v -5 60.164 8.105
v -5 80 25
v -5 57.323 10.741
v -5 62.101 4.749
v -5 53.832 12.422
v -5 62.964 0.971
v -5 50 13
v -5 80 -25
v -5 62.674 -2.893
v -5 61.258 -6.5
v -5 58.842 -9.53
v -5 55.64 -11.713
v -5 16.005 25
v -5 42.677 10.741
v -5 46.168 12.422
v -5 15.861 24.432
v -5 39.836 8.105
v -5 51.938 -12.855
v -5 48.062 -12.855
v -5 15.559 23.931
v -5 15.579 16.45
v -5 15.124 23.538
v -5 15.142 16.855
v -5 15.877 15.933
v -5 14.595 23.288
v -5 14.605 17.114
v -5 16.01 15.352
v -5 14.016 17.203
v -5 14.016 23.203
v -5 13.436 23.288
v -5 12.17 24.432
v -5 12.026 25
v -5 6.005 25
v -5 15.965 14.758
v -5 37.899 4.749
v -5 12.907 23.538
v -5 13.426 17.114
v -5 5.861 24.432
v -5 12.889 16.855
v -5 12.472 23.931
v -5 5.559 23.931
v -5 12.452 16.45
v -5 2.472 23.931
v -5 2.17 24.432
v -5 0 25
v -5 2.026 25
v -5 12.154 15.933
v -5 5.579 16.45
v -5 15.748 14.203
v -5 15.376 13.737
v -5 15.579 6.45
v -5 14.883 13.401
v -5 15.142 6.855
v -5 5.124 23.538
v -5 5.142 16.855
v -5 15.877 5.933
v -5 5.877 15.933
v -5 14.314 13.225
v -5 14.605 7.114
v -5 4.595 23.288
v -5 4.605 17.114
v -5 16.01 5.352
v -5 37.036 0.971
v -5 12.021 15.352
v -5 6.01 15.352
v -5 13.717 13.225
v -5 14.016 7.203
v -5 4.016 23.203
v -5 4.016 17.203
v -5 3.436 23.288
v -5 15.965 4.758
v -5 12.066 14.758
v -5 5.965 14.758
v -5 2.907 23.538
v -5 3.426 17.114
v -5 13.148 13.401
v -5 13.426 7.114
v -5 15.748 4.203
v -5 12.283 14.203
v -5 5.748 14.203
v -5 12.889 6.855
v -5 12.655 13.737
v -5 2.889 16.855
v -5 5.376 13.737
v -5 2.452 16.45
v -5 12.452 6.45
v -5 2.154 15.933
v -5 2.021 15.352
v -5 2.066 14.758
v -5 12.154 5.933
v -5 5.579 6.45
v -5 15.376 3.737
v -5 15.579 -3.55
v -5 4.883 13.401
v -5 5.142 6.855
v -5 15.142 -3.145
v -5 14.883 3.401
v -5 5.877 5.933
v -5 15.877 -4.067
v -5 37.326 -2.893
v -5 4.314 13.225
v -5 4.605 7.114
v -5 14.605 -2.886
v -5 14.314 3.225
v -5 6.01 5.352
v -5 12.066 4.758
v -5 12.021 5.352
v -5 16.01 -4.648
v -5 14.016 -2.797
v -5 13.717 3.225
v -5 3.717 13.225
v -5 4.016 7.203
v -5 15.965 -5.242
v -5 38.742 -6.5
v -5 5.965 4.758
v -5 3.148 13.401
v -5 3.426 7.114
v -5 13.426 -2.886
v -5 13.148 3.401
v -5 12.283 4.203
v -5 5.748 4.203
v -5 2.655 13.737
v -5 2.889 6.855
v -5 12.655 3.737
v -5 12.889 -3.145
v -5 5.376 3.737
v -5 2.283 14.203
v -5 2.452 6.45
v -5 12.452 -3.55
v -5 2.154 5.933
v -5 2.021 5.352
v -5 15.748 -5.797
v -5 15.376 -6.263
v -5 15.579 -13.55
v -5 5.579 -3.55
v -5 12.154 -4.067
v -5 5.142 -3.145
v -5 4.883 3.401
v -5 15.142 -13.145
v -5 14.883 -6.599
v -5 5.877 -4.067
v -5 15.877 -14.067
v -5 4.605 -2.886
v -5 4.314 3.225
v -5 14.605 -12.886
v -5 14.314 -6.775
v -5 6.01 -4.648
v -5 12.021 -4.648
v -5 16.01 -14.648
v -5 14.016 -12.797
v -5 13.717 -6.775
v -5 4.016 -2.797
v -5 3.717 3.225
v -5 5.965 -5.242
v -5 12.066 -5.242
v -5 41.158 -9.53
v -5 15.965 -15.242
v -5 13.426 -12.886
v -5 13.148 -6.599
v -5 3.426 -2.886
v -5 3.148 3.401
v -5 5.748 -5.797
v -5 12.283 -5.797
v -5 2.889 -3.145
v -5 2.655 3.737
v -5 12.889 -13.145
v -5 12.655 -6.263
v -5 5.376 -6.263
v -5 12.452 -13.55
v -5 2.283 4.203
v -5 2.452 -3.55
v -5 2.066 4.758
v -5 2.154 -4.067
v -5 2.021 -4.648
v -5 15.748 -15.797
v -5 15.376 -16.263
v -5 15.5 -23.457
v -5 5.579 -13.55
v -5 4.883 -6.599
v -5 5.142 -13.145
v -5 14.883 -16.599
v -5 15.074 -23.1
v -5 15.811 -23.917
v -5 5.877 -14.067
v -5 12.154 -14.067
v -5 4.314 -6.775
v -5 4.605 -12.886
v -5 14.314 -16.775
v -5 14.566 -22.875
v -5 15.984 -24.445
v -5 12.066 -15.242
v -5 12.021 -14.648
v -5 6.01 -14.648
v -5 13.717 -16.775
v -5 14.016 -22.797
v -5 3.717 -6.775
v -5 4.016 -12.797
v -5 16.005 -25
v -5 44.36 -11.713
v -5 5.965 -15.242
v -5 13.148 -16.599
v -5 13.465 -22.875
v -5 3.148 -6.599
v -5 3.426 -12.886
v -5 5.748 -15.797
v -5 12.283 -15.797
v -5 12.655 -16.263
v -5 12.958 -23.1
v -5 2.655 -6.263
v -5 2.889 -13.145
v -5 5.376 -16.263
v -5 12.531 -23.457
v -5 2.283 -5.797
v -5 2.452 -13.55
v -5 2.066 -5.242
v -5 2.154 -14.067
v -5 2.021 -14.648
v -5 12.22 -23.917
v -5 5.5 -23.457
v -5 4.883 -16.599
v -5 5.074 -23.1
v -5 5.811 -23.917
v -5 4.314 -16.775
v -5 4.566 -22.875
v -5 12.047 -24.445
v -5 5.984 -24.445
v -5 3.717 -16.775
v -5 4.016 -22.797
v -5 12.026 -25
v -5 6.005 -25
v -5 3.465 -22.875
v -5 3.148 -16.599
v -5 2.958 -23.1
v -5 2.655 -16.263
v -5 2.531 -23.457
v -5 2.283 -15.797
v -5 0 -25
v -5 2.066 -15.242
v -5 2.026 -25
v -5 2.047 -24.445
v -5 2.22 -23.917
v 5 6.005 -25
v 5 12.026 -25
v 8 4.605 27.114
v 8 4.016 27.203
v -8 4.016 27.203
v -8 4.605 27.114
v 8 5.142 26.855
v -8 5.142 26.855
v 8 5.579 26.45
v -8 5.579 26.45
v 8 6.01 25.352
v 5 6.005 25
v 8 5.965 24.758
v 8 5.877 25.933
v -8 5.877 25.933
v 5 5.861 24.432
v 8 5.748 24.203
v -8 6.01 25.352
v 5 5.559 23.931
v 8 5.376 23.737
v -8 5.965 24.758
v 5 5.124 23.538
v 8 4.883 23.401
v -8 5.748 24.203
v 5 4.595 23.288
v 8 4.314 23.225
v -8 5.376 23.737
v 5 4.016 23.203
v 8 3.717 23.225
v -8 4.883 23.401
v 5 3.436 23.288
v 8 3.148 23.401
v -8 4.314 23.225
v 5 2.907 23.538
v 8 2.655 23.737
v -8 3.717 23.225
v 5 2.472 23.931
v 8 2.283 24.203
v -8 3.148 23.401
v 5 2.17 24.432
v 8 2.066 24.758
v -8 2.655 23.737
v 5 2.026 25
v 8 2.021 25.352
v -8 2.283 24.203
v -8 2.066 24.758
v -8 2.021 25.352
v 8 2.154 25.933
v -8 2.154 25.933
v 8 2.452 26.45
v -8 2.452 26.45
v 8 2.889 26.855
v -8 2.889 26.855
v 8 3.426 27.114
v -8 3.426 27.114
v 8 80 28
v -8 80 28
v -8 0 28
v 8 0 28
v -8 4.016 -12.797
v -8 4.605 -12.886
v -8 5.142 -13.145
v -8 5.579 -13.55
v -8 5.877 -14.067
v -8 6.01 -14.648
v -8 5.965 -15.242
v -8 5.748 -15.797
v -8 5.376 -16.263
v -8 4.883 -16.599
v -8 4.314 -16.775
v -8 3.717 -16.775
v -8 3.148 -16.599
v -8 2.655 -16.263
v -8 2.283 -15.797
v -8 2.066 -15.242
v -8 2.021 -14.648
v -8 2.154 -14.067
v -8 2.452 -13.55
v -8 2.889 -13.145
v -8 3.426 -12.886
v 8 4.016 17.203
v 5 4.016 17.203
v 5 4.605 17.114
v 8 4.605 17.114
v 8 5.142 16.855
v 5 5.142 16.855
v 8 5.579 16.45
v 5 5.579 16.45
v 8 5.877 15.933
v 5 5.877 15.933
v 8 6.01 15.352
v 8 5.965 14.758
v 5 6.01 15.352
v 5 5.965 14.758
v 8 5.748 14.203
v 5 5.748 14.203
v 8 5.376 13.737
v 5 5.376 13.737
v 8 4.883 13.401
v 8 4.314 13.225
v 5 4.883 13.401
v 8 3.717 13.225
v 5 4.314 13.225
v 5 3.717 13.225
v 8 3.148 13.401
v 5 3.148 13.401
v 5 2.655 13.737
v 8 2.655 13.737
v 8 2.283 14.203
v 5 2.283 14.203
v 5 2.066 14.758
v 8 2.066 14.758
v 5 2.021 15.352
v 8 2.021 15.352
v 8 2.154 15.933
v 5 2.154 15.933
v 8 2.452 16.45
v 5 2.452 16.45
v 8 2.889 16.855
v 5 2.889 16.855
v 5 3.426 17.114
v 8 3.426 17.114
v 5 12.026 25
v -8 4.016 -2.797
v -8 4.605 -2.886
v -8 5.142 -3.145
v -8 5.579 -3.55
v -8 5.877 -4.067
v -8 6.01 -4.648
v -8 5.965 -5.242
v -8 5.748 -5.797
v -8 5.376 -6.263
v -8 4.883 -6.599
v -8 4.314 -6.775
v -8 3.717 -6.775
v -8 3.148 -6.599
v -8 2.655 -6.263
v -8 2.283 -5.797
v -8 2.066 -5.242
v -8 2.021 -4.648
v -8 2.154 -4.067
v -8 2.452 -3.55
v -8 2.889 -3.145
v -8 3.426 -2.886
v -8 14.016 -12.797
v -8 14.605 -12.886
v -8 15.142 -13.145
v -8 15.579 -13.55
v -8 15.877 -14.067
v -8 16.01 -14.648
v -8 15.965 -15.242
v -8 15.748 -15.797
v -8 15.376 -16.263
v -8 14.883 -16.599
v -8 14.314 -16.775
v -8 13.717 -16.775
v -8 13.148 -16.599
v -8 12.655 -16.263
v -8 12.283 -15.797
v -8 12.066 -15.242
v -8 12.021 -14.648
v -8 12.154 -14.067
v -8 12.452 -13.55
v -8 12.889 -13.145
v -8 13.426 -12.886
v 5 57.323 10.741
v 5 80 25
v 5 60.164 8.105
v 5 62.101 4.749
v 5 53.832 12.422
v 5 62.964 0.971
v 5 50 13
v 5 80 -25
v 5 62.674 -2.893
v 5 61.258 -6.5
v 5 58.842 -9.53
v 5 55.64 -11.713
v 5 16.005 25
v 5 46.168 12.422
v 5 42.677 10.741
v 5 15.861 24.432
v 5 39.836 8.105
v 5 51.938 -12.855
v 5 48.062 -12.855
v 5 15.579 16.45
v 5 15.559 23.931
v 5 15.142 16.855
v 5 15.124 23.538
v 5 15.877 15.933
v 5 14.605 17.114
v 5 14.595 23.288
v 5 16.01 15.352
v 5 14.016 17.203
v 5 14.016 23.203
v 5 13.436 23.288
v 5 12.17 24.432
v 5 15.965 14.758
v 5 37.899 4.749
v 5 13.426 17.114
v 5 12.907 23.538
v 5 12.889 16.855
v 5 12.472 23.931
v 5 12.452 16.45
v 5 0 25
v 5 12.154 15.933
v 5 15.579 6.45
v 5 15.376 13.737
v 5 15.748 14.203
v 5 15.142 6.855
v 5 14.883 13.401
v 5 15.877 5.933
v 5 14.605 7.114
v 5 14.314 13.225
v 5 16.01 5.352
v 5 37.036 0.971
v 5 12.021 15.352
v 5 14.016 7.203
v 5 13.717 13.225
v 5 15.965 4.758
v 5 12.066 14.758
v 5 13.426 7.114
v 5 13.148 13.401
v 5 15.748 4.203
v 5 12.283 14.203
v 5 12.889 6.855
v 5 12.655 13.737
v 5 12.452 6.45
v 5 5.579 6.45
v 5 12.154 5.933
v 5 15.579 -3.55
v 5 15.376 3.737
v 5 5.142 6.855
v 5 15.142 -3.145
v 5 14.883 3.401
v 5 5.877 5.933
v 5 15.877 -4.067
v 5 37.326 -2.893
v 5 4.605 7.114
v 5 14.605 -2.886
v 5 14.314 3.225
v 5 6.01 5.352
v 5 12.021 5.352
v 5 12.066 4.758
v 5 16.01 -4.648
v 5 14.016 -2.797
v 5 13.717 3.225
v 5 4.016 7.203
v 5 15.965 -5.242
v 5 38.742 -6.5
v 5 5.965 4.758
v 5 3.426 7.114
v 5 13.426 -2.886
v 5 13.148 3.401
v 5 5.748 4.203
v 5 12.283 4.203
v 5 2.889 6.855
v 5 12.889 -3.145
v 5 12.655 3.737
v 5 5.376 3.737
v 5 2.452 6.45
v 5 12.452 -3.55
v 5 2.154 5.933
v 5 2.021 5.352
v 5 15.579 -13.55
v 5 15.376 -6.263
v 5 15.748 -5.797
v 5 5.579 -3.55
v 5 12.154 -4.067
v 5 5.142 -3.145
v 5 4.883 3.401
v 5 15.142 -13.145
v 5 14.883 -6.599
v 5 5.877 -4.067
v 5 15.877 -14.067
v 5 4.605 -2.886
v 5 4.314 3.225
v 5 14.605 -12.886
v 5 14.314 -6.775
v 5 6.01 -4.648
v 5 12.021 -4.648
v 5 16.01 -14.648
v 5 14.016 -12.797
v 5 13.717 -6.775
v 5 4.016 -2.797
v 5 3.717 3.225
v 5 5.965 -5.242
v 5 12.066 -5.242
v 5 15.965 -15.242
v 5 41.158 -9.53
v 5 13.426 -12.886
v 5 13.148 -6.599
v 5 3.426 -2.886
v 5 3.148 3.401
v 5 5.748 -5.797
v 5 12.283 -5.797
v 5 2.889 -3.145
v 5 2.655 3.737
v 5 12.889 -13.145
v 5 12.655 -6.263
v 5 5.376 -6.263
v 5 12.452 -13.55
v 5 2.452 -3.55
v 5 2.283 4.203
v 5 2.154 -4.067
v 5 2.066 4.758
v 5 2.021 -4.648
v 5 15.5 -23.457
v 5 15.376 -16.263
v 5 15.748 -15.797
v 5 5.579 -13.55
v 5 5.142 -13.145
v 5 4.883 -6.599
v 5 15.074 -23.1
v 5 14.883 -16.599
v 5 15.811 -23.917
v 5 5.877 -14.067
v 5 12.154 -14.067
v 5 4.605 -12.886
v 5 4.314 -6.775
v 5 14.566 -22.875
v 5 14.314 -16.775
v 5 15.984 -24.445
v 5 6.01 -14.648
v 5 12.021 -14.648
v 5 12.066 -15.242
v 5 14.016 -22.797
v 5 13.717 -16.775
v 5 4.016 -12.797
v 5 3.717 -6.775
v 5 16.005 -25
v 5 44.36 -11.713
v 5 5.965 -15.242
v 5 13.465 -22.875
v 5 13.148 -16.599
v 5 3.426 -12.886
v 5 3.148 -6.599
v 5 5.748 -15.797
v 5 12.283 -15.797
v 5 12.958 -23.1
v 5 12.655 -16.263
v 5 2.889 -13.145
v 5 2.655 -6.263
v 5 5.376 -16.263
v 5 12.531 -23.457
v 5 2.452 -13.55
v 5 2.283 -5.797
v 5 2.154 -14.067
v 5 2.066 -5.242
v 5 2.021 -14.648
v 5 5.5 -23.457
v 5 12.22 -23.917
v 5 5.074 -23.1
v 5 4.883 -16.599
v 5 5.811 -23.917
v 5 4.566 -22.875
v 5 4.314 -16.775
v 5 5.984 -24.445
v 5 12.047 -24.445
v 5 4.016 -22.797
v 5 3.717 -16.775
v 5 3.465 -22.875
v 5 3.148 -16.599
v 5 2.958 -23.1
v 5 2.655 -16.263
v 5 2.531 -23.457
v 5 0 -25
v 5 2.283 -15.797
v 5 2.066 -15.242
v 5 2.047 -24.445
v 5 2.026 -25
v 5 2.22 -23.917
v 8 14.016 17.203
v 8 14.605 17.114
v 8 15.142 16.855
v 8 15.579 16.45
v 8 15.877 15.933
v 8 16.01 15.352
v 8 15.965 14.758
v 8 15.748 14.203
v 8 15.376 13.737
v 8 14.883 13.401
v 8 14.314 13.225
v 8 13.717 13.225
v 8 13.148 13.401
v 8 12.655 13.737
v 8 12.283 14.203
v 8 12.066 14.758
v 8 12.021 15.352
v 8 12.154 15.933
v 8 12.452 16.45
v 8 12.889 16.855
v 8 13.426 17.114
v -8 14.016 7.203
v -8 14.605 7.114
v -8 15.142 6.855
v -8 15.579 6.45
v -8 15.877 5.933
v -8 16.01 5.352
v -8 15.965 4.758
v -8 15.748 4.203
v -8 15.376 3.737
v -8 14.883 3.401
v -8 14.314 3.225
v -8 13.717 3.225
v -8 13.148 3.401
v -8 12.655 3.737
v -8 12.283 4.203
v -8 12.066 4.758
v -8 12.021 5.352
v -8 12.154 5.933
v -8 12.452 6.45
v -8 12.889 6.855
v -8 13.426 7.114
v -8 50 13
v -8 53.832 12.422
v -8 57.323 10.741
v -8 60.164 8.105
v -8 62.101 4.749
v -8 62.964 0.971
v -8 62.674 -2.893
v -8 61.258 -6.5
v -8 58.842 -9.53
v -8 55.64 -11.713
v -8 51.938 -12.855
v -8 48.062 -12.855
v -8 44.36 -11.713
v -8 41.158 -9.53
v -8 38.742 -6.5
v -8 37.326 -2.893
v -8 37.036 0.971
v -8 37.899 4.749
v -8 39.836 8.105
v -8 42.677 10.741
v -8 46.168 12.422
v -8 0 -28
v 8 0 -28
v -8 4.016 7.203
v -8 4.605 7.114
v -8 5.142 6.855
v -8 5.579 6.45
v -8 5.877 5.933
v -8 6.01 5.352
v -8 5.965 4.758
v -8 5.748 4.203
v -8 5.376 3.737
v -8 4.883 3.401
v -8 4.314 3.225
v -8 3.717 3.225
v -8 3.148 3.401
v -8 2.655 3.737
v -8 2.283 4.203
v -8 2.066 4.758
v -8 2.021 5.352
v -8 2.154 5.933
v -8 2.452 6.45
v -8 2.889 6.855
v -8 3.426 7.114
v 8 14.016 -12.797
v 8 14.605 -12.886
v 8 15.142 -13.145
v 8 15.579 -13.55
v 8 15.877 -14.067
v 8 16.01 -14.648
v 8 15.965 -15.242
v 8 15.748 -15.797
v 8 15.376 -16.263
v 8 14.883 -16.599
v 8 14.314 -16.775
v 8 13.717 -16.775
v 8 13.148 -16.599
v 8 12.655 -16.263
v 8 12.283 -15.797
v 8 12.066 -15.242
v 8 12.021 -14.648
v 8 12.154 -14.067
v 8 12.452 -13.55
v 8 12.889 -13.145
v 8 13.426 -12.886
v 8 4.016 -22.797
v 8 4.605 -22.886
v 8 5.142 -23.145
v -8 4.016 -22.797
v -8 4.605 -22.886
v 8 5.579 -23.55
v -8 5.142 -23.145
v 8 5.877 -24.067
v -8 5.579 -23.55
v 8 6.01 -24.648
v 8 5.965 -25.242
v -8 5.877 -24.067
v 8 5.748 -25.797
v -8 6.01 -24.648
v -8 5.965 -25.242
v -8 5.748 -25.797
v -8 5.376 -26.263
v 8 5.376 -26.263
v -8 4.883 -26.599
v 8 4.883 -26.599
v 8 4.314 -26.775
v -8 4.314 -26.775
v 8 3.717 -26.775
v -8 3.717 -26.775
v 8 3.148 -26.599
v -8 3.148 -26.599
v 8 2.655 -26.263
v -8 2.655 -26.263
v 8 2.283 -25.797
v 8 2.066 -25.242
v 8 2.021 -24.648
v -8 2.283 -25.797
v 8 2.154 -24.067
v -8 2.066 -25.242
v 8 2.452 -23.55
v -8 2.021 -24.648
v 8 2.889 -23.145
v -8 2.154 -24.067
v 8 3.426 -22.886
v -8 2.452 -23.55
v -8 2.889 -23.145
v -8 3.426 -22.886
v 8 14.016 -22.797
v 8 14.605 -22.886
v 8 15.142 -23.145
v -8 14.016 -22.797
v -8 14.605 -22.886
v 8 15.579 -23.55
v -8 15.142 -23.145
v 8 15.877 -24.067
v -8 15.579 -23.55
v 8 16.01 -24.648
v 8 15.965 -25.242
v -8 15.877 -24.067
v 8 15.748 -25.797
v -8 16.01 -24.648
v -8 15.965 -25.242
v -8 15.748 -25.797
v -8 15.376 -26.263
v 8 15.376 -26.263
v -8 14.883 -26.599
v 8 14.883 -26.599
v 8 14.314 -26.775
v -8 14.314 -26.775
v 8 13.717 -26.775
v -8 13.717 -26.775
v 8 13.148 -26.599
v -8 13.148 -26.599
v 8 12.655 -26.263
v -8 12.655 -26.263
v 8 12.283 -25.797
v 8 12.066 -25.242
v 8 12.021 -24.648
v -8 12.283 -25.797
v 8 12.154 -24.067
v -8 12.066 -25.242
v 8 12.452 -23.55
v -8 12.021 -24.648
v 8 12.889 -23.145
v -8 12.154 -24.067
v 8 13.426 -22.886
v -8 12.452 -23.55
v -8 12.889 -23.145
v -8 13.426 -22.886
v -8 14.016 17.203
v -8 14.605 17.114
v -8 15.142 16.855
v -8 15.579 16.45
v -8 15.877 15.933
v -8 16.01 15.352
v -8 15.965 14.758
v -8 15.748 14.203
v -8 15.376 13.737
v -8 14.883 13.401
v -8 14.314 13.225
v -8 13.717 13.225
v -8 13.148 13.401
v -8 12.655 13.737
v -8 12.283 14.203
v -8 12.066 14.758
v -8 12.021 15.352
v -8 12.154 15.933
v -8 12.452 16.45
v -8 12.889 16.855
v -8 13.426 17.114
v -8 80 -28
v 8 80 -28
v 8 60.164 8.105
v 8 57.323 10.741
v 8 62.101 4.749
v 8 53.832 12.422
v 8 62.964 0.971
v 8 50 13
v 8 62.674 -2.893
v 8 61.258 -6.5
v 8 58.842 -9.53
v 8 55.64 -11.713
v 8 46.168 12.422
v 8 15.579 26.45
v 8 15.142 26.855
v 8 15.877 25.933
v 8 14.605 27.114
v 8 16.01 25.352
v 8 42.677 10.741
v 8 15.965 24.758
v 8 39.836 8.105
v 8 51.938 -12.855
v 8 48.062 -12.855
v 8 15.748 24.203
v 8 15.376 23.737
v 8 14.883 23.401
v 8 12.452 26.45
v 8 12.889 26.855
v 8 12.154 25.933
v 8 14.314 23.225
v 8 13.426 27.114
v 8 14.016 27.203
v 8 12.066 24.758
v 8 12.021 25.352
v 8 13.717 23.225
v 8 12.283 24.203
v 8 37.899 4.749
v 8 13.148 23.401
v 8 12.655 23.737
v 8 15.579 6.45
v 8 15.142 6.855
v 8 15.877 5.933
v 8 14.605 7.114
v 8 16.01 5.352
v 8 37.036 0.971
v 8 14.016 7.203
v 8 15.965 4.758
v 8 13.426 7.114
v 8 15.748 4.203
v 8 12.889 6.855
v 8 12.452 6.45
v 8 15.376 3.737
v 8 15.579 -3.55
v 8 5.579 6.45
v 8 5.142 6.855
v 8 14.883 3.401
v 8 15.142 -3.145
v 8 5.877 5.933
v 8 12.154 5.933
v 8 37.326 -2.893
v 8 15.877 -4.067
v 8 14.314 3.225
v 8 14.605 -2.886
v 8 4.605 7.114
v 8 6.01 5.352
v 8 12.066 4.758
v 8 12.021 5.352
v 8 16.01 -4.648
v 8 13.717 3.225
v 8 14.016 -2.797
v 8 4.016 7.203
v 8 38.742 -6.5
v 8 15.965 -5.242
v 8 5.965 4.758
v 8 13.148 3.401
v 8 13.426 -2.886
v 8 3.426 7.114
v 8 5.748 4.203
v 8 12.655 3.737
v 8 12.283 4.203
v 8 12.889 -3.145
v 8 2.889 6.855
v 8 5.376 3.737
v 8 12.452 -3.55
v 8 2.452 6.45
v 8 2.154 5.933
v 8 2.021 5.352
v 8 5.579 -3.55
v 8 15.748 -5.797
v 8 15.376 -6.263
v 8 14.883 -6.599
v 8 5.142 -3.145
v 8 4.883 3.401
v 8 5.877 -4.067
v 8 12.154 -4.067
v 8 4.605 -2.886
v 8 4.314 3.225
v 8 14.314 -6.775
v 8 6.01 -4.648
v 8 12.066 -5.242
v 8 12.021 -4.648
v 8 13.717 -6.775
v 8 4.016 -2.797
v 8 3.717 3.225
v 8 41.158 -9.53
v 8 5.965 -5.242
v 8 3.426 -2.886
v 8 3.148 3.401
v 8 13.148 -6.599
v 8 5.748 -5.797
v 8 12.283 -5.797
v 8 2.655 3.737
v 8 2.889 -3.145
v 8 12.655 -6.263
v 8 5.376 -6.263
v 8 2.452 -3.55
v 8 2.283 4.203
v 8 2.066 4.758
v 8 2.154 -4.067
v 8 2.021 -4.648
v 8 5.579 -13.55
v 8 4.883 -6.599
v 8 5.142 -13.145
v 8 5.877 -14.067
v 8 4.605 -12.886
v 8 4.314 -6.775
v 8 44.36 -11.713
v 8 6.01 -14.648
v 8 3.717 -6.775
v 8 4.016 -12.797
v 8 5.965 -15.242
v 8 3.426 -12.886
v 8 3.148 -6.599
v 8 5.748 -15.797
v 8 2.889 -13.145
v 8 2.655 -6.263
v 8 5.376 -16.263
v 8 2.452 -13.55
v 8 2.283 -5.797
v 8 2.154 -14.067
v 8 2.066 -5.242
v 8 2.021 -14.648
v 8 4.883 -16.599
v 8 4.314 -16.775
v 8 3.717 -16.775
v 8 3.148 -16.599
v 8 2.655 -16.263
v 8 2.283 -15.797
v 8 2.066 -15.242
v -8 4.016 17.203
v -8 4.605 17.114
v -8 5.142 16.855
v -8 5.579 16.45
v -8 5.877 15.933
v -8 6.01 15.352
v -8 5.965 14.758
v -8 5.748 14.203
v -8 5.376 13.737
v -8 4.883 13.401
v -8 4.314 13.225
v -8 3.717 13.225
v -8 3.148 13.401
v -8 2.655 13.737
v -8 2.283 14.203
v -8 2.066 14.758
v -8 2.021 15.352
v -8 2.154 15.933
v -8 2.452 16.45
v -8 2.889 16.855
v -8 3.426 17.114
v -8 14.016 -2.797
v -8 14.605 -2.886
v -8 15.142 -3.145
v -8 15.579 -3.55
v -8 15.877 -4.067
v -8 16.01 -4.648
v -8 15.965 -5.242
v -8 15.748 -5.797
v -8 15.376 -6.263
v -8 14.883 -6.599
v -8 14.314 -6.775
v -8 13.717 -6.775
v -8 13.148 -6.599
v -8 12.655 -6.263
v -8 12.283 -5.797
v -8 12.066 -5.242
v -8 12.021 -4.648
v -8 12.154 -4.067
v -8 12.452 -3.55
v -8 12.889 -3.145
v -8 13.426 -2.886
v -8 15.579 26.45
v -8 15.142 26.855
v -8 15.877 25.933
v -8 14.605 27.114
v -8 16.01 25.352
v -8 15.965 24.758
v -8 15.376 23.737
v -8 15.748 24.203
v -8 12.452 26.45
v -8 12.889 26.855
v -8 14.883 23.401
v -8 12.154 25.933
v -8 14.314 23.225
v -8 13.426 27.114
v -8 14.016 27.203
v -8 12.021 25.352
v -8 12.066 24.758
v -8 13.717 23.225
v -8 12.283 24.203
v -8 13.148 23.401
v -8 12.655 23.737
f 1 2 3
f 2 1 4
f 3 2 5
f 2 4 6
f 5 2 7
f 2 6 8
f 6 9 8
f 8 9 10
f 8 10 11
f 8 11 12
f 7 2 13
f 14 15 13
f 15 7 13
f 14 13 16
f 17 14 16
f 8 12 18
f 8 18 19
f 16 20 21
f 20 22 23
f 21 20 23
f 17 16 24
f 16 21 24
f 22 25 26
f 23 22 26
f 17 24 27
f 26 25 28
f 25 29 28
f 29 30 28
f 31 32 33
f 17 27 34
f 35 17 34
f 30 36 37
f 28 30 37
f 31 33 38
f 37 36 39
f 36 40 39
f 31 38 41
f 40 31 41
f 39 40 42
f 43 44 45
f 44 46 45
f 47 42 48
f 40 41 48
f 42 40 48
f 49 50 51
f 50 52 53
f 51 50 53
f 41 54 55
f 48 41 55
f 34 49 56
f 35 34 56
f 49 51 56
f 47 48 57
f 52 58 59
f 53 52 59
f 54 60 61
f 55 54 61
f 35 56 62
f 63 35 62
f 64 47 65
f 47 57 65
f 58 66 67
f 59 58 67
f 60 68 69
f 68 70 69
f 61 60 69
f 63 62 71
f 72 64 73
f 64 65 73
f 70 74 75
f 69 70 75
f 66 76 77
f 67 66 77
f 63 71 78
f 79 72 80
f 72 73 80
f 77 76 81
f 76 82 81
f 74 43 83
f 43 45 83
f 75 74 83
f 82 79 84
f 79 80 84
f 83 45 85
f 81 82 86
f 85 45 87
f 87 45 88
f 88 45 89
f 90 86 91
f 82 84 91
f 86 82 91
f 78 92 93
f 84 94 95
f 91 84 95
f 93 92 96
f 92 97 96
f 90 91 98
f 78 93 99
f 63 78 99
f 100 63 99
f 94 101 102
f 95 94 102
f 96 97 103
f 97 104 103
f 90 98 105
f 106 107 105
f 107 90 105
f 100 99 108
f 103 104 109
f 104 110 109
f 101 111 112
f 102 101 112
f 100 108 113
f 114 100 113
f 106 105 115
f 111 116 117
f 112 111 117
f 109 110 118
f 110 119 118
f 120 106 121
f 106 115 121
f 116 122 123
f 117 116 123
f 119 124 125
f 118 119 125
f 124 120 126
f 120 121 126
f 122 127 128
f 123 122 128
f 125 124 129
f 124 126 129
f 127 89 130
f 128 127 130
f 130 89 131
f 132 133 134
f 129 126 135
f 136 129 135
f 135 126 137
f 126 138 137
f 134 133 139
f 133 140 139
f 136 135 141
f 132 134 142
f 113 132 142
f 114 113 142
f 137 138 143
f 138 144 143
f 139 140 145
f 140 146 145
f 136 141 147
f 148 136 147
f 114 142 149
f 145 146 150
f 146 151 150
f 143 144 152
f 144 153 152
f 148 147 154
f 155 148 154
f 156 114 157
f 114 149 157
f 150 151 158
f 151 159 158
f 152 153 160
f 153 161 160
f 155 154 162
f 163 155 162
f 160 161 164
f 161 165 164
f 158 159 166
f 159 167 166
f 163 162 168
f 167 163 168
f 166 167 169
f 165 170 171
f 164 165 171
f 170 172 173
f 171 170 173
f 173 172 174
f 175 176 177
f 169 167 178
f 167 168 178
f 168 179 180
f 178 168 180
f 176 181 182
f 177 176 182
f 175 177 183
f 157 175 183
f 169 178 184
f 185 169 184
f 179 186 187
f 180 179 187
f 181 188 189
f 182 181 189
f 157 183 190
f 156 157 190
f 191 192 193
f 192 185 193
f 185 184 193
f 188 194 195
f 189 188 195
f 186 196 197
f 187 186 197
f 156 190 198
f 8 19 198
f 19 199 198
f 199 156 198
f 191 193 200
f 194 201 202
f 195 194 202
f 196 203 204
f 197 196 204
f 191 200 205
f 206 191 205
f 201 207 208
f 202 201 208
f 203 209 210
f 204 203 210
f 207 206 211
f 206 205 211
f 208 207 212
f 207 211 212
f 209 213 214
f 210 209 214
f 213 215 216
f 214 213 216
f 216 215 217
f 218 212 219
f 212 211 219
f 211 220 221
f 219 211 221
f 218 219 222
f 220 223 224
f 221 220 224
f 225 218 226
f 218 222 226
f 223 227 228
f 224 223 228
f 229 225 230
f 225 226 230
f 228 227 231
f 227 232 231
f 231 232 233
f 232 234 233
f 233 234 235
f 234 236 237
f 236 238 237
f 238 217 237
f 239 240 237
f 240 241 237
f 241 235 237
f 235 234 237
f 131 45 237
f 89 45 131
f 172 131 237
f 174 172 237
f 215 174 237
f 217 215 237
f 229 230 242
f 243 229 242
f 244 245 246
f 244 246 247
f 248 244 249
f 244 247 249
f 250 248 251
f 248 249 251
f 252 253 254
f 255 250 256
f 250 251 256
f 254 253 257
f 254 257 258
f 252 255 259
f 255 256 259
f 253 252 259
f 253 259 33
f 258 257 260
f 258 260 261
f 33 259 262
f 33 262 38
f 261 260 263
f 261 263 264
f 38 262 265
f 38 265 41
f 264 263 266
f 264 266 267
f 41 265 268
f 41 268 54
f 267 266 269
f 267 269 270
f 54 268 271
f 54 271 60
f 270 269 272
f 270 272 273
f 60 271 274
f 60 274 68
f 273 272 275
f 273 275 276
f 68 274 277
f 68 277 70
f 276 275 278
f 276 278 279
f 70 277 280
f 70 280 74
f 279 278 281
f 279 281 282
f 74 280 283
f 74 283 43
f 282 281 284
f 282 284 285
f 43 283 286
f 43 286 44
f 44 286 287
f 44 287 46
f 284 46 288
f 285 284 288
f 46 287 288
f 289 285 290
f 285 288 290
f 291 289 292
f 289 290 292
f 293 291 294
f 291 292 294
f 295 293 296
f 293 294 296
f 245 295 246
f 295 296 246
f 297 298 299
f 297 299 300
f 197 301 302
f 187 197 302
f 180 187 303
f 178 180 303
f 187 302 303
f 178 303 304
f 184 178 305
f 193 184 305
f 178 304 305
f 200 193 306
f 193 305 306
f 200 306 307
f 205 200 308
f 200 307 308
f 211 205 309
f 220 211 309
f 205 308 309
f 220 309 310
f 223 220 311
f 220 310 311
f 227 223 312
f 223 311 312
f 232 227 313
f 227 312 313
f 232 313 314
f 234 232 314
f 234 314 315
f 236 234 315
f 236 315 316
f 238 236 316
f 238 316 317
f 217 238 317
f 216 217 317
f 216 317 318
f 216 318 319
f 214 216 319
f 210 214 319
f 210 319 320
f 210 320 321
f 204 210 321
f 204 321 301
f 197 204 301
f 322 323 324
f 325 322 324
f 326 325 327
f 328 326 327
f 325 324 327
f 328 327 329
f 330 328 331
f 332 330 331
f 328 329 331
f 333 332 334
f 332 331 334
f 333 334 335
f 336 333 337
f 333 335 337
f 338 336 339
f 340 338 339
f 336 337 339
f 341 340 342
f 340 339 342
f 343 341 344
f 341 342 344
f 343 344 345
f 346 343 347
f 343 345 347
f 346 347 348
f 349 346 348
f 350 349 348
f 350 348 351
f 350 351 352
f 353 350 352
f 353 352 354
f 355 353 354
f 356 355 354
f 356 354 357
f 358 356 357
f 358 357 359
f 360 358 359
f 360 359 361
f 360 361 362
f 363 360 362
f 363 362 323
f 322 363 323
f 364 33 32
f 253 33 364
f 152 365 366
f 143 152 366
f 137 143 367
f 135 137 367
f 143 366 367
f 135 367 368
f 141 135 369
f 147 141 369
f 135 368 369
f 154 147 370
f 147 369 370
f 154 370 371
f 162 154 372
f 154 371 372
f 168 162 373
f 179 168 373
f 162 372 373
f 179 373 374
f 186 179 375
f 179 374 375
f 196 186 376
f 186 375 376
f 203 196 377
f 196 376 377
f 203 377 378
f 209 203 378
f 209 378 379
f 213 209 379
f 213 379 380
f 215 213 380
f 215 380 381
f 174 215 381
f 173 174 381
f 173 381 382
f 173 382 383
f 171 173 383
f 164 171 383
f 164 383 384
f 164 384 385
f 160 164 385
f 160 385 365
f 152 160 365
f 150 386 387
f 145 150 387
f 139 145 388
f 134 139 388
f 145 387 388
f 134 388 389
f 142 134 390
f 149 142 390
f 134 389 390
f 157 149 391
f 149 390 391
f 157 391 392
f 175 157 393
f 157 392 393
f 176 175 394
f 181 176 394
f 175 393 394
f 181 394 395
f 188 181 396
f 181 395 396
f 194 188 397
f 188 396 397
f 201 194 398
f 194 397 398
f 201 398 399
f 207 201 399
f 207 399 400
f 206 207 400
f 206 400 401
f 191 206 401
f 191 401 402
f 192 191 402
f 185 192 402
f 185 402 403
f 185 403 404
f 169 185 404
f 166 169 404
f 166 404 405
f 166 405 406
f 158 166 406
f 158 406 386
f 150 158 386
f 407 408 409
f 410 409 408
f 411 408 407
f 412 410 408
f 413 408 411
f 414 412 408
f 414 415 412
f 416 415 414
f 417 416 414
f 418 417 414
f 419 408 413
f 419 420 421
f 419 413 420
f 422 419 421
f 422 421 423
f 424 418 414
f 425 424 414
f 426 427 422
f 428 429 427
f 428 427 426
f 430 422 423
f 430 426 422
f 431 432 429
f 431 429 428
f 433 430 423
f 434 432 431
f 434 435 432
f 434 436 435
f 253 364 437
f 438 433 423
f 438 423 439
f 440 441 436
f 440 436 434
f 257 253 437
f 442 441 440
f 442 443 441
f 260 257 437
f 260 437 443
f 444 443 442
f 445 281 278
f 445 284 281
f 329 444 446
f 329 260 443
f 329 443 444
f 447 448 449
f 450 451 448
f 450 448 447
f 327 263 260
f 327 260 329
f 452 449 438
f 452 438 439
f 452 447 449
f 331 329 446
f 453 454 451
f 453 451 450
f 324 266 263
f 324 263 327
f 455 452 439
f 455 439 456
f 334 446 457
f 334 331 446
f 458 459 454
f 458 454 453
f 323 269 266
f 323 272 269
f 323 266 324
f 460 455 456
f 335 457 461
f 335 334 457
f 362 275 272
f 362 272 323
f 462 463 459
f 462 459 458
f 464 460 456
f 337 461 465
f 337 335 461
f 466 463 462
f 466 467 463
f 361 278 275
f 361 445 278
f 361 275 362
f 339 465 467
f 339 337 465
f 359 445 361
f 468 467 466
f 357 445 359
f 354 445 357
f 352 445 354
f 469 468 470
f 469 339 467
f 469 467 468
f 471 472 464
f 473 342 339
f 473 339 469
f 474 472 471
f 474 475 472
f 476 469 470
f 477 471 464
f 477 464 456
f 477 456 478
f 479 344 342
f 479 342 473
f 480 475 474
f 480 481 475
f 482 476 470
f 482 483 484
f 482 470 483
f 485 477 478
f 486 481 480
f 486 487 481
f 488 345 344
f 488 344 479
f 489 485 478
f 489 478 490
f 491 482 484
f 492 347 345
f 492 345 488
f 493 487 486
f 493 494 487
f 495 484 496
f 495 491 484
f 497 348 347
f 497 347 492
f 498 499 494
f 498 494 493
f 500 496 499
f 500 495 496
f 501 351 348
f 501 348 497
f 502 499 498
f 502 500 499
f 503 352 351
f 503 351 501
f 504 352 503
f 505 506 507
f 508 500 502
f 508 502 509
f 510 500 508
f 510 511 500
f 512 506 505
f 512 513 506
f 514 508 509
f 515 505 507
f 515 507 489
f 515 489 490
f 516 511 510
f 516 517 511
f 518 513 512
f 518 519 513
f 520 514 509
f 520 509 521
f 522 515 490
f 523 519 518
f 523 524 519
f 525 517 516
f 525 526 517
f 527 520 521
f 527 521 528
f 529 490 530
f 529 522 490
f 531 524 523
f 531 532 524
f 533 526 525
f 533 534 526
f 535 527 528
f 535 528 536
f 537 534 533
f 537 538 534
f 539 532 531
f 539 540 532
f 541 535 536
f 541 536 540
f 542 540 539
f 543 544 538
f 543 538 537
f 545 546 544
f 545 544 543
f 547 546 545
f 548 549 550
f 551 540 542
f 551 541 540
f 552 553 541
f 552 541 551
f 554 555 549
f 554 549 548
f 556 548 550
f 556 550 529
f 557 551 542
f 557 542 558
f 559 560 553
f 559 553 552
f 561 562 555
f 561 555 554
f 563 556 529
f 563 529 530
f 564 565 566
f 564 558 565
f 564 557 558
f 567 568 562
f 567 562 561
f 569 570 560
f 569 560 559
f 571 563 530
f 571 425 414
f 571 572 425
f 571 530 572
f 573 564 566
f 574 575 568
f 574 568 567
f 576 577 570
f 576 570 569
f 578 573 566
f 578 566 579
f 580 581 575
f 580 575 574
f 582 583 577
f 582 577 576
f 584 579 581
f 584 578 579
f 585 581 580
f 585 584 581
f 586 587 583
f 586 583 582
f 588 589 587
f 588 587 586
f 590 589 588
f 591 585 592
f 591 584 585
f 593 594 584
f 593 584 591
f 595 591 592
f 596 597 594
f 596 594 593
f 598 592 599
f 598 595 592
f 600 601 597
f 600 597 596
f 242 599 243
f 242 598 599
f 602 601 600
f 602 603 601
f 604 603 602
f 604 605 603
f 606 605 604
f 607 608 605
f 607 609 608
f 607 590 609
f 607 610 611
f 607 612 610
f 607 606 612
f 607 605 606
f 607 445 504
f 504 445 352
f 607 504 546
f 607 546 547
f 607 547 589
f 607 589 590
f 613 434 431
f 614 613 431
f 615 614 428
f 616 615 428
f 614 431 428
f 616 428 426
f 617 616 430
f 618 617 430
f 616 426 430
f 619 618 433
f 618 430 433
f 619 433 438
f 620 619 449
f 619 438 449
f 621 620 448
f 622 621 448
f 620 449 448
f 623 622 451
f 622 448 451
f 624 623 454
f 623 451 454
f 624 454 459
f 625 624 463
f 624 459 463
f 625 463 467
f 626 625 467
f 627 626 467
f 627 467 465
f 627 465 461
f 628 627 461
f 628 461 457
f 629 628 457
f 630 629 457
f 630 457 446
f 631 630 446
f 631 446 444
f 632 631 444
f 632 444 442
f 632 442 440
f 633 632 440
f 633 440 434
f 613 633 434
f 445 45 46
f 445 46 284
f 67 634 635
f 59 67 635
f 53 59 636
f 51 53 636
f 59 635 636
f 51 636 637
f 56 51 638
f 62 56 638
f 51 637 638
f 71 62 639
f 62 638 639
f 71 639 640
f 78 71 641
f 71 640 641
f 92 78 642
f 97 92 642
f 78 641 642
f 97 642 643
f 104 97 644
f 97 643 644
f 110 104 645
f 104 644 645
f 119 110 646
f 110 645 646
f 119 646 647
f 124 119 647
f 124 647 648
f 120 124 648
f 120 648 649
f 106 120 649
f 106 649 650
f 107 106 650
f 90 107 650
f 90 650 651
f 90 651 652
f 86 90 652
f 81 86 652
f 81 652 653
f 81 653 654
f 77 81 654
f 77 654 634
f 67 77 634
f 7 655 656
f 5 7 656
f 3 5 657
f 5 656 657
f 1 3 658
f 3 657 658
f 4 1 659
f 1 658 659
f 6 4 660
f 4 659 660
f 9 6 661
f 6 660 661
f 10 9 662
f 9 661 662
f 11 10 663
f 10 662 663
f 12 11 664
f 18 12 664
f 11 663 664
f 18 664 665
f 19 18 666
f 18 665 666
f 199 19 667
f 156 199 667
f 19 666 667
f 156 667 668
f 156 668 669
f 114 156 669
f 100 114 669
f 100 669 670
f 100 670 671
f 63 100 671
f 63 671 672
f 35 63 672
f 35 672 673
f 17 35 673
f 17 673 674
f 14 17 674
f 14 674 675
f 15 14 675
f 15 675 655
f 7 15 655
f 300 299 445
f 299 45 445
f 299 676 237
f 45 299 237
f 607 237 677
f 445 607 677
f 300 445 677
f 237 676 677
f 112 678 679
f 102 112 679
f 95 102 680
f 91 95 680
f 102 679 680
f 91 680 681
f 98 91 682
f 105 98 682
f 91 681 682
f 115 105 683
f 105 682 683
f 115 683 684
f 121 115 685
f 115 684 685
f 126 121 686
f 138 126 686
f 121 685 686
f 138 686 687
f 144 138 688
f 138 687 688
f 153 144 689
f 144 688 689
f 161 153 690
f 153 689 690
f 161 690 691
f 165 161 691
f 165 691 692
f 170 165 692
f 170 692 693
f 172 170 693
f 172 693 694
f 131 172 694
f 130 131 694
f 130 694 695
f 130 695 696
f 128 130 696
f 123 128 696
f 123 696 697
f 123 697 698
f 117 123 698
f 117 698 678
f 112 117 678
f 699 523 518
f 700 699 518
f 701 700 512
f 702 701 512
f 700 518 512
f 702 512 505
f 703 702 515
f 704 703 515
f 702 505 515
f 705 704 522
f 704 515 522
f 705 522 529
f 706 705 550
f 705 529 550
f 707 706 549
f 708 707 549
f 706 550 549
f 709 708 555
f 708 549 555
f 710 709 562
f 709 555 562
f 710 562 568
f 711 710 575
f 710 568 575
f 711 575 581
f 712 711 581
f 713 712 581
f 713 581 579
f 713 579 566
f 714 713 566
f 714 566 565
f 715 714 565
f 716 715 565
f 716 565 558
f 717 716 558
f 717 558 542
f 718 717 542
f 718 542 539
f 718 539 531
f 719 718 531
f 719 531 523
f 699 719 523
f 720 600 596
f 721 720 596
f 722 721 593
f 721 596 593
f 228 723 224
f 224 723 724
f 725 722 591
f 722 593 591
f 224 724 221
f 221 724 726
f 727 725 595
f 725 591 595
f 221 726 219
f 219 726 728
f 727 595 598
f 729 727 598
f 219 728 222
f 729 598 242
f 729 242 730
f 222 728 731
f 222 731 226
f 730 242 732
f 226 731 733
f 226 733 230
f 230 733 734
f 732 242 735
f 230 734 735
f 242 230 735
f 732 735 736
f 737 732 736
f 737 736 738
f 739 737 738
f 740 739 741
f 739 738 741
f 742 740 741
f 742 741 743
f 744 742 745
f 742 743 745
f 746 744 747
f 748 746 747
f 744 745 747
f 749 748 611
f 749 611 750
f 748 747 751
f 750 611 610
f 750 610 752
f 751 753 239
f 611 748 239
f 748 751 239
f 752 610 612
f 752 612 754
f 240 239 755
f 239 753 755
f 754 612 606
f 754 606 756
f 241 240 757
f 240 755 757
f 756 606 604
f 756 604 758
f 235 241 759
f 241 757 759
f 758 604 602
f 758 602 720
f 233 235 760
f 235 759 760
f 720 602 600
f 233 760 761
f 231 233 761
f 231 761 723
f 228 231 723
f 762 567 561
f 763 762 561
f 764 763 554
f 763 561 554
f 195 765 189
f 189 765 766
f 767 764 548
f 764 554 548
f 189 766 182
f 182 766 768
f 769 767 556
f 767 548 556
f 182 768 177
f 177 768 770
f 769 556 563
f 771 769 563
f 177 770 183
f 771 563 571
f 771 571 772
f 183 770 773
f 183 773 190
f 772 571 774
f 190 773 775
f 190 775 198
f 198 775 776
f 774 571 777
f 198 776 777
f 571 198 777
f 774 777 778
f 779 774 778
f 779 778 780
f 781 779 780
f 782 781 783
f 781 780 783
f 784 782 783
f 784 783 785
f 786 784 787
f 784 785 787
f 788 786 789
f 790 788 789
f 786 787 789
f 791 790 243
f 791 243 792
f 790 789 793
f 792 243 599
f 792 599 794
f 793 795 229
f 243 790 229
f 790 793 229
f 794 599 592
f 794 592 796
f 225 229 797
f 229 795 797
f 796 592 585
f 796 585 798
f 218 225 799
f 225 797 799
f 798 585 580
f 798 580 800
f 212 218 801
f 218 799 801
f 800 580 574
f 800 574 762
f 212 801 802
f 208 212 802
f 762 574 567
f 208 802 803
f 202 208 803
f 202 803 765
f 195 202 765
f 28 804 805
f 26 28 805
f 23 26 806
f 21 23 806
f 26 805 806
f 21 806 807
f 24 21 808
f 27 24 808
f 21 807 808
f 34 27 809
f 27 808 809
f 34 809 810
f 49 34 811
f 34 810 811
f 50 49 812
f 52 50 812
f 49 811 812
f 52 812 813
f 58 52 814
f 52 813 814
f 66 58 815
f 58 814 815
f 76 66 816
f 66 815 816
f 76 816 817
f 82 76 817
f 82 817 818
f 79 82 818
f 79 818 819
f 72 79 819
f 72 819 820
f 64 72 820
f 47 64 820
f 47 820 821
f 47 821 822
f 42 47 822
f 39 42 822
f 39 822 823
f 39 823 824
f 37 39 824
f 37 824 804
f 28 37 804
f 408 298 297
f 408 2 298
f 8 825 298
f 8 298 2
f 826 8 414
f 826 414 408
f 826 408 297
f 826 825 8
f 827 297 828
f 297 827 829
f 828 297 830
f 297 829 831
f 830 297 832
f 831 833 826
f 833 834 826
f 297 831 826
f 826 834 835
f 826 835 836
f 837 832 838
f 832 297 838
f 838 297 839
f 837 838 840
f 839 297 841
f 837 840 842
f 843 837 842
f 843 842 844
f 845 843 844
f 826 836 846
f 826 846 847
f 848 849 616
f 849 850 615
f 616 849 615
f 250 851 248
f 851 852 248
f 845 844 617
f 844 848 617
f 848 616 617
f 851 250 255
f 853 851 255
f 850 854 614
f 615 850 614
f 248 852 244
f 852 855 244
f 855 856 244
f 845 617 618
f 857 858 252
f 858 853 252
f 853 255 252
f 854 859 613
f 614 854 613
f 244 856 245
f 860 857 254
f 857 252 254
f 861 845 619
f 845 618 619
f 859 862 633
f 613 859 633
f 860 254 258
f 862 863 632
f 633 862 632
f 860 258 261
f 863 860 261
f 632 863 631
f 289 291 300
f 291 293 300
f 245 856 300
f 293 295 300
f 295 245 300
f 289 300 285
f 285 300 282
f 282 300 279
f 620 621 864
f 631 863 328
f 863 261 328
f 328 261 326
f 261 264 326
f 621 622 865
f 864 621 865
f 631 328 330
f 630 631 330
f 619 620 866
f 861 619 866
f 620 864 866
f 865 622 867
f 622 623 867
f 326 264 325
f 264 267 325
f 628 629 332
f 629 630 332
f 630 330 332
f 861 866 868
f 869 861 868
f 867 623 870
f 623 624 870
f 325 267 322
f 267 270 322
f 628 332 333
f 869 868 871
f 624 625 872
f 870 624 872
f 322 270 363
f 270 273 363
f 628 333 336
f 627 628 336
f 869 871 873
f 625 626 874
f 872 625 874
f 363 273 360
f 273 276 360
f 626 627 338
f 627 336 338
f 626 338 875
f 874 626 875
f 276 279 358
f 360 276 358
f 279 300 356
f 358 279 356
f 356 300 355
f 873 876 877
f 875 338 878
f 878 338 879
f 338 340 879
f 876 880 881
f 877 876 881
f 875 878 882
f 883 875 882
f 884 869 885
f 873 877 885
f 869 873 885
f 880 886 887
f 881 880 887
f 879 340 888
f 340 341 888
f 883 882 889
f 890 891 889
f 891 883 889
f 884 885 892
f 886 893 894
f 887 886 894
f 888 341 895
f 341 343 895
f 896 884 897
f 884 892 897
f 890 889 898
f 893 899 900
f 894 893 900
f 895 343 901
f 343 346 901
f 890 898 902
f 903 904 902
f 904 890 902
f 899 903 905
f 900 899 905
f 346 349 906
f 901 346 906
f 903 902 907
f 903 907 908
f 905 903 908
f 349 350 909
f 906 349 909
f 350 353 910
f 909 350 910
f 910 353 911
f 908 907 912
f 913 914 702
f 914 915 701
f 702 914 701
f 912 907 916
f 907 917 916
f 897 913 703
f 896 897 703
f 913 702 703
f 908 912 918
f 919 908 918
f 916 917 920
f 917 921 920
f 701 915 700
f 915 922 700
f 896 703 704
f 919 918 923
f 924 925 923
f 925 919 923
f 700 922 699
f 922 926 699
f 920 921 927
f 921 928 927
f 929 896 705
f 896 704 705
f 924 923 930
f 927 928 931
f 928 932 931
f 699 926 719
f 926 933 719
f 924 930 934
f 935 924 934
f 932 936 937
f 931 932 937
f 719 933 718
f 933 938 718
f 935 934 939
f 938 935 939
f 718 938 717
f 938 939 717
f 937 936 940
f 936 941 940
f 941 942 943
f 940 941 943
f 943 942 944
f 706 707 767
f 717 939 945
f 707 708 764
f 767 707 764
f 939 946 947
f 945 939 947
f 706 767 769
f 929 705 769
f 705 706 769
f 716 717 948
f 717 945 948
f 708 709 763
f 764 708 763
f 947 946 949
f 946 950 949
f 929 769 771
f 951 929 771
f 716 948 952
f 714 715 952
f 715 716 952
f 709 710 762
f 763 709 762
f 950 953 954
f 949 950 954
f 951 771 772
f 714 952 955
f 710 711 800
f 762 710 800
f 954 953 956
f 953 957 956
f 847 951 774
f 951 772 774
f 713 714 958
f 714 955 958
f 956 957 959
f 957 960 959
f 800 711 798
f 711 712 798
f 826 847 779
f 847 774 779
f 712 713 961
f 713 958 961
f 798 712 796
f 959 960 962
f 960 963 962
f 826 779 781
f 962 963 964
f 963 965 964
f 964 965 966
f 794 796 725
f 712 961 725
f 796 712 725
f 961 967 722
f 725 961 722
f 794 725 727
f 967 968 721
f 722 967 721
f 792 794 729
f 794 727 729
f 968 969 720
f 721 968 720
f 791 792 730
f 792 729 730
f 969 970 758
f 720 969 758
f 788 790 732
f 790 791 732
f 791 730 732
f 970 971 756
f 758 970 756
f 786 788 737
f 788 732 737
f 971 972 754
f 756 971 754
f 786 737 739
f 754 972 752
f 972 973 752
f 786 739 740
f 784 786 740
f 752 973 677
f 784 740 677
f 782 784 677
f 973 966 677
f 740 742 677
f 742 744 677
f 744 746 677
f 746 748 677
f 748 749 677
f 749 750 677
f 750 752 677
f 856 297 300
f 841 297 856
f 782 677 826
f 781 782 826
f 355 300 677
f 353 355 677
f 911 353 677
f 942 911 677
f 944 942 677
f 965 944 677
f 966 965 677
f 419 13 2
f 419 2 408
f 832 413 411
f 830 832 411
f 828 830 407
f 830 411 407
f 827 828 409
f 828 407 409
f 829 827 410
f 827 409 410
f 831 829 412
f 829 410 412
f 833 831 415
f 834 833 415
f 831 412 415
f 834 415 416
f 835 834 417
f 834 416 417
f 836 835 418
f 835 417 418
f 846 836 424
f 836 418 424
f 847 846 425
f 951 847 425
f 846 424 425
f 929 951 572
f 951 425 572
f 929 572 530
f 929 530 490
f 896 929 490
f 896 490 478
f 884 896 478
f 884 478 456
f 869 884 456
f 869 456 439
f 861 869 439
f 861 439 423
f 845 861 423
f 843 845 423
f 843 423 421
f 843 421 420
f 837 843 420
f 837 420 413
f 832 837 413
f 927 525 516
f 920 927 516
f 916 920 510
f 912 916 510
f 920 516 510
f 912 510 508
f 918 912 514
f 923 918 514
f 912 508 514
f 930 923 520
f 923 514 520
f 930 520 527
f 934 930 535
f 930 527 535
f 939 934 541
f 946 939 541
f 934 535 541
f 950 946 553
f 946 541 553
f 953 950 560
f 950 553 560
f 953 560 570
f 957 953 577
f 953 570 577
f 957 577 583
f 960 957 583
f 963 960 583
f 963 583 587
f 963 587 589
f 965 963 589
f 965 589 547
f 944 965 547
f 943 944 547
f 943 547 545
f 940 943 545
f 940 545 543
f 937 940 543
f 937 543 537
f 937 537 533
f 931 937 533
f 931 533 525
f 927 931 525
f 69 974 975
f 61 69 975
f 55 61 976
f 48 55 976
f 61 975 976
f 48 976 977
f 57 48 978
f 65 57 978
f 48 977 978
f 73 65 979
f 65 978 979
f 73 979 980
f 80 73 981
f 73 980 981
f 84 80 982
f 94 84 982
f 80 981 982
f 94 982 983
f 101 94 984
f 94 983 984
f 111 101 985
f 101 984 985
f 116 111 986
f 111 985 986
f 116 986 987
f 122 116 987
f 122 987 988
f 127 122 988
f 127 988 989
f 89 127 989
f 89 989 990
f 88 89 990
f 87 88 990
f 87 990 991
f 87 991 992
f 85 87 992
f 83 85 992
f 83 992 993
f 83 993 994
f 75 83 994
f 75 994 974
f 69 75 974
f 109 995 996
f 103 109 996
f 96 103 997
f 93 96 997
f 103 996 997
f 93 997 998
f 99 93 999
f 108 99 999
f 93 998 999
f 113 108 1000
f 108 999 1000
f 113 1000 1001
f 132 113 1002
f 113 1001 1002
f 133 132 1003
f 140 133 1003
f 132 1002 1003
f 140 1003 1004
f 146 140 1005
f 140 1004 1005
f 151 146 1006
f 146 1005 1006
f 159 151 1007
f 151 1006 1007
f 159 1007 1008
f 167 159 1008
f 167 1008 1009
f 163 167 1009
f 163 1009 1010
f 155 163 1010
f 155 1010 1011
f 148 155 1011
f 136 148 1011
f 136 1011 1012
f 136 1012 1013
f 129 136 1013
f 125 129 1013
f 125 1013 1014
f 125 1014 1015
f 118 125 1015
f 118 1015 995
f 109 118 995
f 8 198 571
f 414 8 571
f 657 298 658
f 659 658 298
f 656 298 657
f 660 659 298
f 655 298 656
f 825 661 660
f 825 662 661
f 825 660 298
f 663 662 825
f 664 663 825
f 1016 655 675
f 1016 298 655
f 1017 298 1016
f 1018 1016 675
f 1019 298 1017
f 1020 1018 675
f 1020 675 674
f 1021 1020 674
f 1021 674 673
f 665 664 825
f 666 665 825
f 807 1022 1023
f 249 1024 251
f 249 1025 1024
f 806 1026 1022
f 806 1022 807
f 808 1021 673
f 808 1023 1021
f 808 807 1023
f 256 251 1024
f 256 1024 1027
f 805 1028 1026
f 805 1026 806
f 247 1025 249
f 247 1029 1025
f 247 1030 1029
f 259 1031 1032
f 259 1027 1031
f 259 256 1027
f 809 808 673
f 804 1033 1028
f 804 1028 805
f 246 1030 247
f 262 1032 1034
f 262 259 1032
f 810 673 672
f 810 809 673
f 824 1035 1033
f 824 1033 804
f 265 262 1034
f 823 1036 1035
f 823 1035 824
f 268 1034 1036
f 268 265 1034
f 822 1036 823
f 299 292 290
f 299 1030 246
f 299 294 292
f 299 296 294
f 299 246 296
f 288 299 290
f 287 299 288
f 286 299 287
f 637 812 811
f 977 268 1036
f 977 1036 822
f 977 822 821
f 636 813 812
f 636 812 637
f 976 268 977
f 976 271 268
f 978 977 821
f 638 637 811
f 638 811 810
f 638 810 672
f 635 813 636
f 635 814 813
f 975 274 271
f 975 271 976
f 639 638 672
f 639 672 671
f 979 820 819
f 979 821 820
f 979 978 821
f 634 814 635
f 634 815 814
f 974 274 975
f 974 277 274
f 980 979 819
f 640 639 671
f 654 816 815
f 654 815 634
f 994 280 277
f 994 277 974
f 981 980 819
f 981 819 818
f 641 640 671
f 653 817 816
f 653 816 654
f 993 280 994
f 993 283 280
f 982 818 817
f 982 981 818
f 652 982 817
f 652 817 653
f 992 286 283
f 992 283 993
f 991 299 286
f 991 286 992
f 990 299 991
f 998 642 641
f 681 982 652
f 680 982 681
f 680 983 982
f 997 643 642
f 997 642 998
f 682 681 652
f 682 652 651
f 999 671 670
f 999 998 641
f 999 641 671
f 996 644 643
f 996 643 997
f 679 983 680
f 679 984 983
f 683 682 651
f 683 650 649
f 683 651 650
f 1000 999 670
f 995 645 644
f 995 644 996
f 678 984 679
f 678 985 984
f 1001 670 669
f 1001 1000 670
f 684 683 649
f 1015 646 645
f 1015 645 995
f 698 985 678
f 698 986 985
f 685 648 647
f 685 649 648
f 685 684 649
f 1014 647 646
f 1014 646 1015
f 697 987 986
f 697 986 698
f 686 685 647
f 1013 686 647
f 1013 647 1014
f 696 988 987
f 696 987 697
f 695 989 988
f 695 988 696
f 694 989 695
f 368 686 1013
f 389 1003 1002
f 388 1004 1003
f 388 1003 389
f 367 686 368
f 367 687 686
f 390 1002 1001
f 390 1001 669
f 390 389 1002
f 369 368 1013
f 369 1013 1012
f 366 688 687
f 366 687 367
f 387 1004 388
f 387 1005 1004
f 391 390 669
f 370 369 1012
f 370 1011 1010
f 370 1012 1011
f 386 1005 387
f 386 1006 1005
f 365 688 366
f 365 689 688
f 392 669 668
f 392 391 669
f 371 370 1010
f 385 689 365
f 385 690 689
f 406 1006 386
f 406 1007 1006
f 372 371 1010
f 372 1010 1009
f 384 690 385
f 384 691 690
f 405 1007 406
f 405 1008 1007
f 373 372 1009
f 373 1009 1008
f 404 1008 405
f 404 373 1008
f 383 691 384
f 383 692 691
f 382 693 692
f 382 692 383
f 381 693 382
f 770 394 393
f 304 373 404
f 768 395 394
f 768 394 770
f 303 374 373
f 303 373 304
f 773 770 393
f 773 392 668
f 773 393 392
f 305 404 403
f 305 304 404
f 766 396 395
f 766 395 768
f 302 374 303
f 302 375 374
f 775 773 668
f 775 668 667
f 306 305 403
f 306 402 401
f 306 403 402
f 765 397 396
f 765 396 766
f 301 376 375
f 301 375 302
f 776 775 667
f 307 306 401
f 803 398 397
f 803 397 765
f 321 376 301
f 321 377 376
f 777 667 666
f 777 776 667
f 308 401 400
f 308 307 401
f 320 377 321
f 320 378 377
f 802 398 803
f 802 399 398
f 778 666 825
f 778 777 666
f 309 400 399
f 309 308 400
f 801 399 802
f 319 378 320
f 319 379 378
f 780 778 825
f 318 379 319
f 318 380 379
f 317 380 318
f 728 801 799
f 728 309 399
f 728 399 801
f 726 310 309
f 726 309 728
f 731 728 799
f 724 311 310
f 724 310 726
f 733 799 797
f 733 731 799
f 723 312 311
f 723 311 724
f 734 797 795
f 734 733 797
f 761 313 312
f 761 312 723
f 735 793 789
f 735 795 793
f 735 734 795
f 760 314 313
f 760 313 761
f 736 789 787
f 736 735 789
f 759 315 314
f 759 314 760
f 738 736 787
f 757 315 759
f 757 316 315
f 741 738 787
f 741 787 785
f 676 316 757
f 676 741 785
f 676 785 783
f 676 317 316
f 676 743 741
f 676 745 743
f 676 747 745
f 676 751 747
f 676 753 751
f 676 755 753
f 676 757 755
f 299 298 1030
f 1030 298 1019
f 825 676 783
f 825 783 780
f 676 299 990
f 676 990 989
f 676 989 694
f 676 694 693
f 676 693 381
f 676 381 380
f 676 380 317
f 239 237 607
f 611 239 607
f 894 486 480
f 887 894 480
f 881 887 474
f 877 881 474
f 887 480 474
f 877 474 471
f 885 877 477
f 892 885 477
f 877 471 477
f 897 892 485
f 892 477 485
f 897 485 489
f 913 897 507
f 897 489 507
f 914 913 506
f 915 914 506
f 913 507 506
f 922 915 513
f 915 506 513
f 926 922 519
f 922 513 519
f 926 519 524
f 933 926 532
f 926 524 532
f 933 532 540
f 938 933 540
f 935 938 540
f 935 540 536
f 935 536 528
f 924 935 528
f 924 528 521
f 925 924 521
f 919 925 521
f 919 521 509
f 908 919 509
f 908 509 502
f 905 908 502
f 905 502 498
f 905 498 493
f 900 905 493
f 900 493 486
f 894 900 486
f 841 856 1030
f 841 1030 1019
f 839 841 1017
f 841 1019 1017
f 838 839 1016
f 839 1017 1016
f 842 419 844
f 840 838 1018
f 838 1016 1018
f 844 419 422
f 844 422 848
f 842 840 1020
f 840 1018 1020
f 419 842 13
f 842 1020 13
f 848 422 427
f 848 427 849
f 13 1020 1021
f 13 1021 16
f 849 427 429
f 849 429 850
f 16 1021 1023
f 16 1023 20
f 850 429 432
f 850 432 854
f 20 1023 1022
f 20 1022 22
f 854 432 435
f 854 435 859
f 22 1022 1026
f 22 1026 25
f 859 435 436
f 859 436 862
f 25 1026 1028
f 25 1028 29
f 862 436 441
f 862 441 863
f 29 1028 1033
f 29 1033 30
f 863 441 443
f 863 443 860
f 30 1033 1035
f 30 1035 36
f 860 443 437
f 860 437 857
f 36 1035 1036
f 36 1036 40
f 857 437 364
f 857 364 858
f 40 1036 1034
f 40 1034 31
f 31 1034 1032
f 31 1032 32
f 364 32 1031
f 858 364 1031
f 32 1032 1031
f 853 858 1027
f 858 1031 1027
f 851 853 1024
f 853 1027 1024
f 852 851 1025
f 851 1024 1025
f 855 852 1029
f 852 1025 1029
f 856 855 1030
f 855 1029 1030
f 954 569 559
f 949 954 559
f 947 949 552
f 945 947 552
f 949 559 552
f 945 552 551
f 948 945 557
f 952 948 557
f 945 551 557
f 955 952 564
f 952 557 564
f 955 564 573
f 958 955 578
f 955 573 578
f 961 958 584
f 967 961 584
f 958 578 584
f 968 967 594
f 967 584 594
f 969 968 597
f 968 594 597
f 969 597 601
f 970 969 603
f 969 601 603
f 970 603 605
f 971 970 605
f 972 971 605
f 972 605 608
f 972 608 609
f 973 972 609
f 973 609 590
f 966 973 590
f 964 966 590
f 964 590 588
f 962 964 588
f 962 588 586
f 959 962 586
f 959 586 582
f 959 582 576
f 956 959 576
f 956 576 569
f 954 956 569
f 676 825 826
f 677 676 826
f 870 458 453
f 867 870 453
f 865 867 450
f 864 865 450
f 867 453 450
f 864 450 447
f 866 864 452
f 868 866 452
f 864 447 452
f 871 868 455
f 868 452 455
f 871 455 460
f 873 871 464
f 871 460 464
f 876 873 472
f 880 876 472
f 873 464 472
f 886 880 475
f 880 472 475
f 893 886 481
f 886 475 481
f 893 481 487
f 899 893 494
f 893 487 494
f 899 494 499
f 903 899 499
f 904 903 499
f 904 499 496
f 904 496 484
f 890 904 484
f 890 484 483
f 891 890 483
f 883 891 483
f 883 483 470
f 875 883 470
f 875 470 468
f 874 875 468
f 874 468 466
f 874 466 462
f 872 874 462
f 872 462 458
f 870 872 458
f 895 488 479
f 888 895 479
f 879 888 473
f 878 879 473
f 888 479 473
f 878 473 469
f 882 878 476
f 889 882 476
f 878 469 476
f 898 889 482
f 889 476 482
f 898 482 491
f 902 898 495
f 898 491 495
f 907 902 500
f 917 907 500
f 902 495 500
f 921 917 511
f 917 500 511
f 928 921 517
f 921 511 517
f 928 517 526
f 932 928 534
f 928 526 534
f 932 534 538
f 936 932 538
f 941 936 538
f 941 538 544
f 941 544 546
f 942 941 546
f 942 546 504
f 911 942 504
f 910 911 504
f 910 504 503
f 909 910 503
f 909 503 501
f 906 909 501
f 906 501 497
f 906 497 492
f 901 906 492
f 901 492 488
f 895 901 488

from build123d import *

# Parameters (mm, degrees)
SKETCH1_W           = 16
SKETCH1_H           = 56
SKETCH1_W_2         = 10
SKETCH1_H_2         = 50
EXTRUDE_THIN1_DEPTH = 80
SKETCH2_R           = 13
SKETCH2_R_2         = 2
CUT_EXTRUDE1_DEPTH  = 17


with BuildPart() as part:
    # Sketch1 → Extrude-Thin1 (new body)
    with BuildSketch(Plane(origin=(0, 0, 0), x_dir=(1, 0, 0), z_dir=(0, 1, 0))):
        Rectangle(SKETCH1_W, SKETCH1_H)
        Rectangle(SKETCH1_W_2, SKETCH1_H_2, mode=Mode.SUBTRACT)
    extrude(amount=EXTRUDE_THIN1_DEPTH)

    # Sketch2 → Cut-Extrude1 (cut, through all)
    with BuildSketch(Plane.ZY.offset(8)):
        with Locations((0, 50)):
            Circle(SKETCH2_R)
        with Locations((-24.79735893, 4.015533462)):
            Circle(SKETCH2_R_2)
        with Locations((-14.79735893, 4.015533462)):
            Circle(SKETCH2_R_2)
        with Locations((-4.79735893, 4.015533462)):
            Circle(SKETCH2_R_2)
        with Locations((5.20264107, 4.015533462)):
            Circle(SKETCH2_R_2)
        with Locations((15.20264107, 4.015533462)):
            Circle(SKETCH2_R_2)
        with Locations((25.20264107, 4.015533462)):
            Circle(SKETCH2_R_2)
        with Locations((-14.79735893, 14.015533462)):
            Circle(SKETCH2_R_2)
        with Locations((-4.79735893, 14.015533462)):
            Circle(SKETCH2_R_2)
        with Locations((5.20264107, 14.015533462)):
            Circle(SKETCH2_R_2)
        with Locations((15.20264107, 14.015533462)):
            Circle(SKETCH2_R_2)
        with Locations((25.20264107, 14.015533462)):
            Circle(SKETCH2_R_2)
        with Locations((-24.79735893, 14.015533462)):
            Circle(SKETCH2_R_2)
    extrude(amount=-CUT_EXTRUDE1_DEPTH, mode=Mode.SUBTRACT)


solid = part.part
